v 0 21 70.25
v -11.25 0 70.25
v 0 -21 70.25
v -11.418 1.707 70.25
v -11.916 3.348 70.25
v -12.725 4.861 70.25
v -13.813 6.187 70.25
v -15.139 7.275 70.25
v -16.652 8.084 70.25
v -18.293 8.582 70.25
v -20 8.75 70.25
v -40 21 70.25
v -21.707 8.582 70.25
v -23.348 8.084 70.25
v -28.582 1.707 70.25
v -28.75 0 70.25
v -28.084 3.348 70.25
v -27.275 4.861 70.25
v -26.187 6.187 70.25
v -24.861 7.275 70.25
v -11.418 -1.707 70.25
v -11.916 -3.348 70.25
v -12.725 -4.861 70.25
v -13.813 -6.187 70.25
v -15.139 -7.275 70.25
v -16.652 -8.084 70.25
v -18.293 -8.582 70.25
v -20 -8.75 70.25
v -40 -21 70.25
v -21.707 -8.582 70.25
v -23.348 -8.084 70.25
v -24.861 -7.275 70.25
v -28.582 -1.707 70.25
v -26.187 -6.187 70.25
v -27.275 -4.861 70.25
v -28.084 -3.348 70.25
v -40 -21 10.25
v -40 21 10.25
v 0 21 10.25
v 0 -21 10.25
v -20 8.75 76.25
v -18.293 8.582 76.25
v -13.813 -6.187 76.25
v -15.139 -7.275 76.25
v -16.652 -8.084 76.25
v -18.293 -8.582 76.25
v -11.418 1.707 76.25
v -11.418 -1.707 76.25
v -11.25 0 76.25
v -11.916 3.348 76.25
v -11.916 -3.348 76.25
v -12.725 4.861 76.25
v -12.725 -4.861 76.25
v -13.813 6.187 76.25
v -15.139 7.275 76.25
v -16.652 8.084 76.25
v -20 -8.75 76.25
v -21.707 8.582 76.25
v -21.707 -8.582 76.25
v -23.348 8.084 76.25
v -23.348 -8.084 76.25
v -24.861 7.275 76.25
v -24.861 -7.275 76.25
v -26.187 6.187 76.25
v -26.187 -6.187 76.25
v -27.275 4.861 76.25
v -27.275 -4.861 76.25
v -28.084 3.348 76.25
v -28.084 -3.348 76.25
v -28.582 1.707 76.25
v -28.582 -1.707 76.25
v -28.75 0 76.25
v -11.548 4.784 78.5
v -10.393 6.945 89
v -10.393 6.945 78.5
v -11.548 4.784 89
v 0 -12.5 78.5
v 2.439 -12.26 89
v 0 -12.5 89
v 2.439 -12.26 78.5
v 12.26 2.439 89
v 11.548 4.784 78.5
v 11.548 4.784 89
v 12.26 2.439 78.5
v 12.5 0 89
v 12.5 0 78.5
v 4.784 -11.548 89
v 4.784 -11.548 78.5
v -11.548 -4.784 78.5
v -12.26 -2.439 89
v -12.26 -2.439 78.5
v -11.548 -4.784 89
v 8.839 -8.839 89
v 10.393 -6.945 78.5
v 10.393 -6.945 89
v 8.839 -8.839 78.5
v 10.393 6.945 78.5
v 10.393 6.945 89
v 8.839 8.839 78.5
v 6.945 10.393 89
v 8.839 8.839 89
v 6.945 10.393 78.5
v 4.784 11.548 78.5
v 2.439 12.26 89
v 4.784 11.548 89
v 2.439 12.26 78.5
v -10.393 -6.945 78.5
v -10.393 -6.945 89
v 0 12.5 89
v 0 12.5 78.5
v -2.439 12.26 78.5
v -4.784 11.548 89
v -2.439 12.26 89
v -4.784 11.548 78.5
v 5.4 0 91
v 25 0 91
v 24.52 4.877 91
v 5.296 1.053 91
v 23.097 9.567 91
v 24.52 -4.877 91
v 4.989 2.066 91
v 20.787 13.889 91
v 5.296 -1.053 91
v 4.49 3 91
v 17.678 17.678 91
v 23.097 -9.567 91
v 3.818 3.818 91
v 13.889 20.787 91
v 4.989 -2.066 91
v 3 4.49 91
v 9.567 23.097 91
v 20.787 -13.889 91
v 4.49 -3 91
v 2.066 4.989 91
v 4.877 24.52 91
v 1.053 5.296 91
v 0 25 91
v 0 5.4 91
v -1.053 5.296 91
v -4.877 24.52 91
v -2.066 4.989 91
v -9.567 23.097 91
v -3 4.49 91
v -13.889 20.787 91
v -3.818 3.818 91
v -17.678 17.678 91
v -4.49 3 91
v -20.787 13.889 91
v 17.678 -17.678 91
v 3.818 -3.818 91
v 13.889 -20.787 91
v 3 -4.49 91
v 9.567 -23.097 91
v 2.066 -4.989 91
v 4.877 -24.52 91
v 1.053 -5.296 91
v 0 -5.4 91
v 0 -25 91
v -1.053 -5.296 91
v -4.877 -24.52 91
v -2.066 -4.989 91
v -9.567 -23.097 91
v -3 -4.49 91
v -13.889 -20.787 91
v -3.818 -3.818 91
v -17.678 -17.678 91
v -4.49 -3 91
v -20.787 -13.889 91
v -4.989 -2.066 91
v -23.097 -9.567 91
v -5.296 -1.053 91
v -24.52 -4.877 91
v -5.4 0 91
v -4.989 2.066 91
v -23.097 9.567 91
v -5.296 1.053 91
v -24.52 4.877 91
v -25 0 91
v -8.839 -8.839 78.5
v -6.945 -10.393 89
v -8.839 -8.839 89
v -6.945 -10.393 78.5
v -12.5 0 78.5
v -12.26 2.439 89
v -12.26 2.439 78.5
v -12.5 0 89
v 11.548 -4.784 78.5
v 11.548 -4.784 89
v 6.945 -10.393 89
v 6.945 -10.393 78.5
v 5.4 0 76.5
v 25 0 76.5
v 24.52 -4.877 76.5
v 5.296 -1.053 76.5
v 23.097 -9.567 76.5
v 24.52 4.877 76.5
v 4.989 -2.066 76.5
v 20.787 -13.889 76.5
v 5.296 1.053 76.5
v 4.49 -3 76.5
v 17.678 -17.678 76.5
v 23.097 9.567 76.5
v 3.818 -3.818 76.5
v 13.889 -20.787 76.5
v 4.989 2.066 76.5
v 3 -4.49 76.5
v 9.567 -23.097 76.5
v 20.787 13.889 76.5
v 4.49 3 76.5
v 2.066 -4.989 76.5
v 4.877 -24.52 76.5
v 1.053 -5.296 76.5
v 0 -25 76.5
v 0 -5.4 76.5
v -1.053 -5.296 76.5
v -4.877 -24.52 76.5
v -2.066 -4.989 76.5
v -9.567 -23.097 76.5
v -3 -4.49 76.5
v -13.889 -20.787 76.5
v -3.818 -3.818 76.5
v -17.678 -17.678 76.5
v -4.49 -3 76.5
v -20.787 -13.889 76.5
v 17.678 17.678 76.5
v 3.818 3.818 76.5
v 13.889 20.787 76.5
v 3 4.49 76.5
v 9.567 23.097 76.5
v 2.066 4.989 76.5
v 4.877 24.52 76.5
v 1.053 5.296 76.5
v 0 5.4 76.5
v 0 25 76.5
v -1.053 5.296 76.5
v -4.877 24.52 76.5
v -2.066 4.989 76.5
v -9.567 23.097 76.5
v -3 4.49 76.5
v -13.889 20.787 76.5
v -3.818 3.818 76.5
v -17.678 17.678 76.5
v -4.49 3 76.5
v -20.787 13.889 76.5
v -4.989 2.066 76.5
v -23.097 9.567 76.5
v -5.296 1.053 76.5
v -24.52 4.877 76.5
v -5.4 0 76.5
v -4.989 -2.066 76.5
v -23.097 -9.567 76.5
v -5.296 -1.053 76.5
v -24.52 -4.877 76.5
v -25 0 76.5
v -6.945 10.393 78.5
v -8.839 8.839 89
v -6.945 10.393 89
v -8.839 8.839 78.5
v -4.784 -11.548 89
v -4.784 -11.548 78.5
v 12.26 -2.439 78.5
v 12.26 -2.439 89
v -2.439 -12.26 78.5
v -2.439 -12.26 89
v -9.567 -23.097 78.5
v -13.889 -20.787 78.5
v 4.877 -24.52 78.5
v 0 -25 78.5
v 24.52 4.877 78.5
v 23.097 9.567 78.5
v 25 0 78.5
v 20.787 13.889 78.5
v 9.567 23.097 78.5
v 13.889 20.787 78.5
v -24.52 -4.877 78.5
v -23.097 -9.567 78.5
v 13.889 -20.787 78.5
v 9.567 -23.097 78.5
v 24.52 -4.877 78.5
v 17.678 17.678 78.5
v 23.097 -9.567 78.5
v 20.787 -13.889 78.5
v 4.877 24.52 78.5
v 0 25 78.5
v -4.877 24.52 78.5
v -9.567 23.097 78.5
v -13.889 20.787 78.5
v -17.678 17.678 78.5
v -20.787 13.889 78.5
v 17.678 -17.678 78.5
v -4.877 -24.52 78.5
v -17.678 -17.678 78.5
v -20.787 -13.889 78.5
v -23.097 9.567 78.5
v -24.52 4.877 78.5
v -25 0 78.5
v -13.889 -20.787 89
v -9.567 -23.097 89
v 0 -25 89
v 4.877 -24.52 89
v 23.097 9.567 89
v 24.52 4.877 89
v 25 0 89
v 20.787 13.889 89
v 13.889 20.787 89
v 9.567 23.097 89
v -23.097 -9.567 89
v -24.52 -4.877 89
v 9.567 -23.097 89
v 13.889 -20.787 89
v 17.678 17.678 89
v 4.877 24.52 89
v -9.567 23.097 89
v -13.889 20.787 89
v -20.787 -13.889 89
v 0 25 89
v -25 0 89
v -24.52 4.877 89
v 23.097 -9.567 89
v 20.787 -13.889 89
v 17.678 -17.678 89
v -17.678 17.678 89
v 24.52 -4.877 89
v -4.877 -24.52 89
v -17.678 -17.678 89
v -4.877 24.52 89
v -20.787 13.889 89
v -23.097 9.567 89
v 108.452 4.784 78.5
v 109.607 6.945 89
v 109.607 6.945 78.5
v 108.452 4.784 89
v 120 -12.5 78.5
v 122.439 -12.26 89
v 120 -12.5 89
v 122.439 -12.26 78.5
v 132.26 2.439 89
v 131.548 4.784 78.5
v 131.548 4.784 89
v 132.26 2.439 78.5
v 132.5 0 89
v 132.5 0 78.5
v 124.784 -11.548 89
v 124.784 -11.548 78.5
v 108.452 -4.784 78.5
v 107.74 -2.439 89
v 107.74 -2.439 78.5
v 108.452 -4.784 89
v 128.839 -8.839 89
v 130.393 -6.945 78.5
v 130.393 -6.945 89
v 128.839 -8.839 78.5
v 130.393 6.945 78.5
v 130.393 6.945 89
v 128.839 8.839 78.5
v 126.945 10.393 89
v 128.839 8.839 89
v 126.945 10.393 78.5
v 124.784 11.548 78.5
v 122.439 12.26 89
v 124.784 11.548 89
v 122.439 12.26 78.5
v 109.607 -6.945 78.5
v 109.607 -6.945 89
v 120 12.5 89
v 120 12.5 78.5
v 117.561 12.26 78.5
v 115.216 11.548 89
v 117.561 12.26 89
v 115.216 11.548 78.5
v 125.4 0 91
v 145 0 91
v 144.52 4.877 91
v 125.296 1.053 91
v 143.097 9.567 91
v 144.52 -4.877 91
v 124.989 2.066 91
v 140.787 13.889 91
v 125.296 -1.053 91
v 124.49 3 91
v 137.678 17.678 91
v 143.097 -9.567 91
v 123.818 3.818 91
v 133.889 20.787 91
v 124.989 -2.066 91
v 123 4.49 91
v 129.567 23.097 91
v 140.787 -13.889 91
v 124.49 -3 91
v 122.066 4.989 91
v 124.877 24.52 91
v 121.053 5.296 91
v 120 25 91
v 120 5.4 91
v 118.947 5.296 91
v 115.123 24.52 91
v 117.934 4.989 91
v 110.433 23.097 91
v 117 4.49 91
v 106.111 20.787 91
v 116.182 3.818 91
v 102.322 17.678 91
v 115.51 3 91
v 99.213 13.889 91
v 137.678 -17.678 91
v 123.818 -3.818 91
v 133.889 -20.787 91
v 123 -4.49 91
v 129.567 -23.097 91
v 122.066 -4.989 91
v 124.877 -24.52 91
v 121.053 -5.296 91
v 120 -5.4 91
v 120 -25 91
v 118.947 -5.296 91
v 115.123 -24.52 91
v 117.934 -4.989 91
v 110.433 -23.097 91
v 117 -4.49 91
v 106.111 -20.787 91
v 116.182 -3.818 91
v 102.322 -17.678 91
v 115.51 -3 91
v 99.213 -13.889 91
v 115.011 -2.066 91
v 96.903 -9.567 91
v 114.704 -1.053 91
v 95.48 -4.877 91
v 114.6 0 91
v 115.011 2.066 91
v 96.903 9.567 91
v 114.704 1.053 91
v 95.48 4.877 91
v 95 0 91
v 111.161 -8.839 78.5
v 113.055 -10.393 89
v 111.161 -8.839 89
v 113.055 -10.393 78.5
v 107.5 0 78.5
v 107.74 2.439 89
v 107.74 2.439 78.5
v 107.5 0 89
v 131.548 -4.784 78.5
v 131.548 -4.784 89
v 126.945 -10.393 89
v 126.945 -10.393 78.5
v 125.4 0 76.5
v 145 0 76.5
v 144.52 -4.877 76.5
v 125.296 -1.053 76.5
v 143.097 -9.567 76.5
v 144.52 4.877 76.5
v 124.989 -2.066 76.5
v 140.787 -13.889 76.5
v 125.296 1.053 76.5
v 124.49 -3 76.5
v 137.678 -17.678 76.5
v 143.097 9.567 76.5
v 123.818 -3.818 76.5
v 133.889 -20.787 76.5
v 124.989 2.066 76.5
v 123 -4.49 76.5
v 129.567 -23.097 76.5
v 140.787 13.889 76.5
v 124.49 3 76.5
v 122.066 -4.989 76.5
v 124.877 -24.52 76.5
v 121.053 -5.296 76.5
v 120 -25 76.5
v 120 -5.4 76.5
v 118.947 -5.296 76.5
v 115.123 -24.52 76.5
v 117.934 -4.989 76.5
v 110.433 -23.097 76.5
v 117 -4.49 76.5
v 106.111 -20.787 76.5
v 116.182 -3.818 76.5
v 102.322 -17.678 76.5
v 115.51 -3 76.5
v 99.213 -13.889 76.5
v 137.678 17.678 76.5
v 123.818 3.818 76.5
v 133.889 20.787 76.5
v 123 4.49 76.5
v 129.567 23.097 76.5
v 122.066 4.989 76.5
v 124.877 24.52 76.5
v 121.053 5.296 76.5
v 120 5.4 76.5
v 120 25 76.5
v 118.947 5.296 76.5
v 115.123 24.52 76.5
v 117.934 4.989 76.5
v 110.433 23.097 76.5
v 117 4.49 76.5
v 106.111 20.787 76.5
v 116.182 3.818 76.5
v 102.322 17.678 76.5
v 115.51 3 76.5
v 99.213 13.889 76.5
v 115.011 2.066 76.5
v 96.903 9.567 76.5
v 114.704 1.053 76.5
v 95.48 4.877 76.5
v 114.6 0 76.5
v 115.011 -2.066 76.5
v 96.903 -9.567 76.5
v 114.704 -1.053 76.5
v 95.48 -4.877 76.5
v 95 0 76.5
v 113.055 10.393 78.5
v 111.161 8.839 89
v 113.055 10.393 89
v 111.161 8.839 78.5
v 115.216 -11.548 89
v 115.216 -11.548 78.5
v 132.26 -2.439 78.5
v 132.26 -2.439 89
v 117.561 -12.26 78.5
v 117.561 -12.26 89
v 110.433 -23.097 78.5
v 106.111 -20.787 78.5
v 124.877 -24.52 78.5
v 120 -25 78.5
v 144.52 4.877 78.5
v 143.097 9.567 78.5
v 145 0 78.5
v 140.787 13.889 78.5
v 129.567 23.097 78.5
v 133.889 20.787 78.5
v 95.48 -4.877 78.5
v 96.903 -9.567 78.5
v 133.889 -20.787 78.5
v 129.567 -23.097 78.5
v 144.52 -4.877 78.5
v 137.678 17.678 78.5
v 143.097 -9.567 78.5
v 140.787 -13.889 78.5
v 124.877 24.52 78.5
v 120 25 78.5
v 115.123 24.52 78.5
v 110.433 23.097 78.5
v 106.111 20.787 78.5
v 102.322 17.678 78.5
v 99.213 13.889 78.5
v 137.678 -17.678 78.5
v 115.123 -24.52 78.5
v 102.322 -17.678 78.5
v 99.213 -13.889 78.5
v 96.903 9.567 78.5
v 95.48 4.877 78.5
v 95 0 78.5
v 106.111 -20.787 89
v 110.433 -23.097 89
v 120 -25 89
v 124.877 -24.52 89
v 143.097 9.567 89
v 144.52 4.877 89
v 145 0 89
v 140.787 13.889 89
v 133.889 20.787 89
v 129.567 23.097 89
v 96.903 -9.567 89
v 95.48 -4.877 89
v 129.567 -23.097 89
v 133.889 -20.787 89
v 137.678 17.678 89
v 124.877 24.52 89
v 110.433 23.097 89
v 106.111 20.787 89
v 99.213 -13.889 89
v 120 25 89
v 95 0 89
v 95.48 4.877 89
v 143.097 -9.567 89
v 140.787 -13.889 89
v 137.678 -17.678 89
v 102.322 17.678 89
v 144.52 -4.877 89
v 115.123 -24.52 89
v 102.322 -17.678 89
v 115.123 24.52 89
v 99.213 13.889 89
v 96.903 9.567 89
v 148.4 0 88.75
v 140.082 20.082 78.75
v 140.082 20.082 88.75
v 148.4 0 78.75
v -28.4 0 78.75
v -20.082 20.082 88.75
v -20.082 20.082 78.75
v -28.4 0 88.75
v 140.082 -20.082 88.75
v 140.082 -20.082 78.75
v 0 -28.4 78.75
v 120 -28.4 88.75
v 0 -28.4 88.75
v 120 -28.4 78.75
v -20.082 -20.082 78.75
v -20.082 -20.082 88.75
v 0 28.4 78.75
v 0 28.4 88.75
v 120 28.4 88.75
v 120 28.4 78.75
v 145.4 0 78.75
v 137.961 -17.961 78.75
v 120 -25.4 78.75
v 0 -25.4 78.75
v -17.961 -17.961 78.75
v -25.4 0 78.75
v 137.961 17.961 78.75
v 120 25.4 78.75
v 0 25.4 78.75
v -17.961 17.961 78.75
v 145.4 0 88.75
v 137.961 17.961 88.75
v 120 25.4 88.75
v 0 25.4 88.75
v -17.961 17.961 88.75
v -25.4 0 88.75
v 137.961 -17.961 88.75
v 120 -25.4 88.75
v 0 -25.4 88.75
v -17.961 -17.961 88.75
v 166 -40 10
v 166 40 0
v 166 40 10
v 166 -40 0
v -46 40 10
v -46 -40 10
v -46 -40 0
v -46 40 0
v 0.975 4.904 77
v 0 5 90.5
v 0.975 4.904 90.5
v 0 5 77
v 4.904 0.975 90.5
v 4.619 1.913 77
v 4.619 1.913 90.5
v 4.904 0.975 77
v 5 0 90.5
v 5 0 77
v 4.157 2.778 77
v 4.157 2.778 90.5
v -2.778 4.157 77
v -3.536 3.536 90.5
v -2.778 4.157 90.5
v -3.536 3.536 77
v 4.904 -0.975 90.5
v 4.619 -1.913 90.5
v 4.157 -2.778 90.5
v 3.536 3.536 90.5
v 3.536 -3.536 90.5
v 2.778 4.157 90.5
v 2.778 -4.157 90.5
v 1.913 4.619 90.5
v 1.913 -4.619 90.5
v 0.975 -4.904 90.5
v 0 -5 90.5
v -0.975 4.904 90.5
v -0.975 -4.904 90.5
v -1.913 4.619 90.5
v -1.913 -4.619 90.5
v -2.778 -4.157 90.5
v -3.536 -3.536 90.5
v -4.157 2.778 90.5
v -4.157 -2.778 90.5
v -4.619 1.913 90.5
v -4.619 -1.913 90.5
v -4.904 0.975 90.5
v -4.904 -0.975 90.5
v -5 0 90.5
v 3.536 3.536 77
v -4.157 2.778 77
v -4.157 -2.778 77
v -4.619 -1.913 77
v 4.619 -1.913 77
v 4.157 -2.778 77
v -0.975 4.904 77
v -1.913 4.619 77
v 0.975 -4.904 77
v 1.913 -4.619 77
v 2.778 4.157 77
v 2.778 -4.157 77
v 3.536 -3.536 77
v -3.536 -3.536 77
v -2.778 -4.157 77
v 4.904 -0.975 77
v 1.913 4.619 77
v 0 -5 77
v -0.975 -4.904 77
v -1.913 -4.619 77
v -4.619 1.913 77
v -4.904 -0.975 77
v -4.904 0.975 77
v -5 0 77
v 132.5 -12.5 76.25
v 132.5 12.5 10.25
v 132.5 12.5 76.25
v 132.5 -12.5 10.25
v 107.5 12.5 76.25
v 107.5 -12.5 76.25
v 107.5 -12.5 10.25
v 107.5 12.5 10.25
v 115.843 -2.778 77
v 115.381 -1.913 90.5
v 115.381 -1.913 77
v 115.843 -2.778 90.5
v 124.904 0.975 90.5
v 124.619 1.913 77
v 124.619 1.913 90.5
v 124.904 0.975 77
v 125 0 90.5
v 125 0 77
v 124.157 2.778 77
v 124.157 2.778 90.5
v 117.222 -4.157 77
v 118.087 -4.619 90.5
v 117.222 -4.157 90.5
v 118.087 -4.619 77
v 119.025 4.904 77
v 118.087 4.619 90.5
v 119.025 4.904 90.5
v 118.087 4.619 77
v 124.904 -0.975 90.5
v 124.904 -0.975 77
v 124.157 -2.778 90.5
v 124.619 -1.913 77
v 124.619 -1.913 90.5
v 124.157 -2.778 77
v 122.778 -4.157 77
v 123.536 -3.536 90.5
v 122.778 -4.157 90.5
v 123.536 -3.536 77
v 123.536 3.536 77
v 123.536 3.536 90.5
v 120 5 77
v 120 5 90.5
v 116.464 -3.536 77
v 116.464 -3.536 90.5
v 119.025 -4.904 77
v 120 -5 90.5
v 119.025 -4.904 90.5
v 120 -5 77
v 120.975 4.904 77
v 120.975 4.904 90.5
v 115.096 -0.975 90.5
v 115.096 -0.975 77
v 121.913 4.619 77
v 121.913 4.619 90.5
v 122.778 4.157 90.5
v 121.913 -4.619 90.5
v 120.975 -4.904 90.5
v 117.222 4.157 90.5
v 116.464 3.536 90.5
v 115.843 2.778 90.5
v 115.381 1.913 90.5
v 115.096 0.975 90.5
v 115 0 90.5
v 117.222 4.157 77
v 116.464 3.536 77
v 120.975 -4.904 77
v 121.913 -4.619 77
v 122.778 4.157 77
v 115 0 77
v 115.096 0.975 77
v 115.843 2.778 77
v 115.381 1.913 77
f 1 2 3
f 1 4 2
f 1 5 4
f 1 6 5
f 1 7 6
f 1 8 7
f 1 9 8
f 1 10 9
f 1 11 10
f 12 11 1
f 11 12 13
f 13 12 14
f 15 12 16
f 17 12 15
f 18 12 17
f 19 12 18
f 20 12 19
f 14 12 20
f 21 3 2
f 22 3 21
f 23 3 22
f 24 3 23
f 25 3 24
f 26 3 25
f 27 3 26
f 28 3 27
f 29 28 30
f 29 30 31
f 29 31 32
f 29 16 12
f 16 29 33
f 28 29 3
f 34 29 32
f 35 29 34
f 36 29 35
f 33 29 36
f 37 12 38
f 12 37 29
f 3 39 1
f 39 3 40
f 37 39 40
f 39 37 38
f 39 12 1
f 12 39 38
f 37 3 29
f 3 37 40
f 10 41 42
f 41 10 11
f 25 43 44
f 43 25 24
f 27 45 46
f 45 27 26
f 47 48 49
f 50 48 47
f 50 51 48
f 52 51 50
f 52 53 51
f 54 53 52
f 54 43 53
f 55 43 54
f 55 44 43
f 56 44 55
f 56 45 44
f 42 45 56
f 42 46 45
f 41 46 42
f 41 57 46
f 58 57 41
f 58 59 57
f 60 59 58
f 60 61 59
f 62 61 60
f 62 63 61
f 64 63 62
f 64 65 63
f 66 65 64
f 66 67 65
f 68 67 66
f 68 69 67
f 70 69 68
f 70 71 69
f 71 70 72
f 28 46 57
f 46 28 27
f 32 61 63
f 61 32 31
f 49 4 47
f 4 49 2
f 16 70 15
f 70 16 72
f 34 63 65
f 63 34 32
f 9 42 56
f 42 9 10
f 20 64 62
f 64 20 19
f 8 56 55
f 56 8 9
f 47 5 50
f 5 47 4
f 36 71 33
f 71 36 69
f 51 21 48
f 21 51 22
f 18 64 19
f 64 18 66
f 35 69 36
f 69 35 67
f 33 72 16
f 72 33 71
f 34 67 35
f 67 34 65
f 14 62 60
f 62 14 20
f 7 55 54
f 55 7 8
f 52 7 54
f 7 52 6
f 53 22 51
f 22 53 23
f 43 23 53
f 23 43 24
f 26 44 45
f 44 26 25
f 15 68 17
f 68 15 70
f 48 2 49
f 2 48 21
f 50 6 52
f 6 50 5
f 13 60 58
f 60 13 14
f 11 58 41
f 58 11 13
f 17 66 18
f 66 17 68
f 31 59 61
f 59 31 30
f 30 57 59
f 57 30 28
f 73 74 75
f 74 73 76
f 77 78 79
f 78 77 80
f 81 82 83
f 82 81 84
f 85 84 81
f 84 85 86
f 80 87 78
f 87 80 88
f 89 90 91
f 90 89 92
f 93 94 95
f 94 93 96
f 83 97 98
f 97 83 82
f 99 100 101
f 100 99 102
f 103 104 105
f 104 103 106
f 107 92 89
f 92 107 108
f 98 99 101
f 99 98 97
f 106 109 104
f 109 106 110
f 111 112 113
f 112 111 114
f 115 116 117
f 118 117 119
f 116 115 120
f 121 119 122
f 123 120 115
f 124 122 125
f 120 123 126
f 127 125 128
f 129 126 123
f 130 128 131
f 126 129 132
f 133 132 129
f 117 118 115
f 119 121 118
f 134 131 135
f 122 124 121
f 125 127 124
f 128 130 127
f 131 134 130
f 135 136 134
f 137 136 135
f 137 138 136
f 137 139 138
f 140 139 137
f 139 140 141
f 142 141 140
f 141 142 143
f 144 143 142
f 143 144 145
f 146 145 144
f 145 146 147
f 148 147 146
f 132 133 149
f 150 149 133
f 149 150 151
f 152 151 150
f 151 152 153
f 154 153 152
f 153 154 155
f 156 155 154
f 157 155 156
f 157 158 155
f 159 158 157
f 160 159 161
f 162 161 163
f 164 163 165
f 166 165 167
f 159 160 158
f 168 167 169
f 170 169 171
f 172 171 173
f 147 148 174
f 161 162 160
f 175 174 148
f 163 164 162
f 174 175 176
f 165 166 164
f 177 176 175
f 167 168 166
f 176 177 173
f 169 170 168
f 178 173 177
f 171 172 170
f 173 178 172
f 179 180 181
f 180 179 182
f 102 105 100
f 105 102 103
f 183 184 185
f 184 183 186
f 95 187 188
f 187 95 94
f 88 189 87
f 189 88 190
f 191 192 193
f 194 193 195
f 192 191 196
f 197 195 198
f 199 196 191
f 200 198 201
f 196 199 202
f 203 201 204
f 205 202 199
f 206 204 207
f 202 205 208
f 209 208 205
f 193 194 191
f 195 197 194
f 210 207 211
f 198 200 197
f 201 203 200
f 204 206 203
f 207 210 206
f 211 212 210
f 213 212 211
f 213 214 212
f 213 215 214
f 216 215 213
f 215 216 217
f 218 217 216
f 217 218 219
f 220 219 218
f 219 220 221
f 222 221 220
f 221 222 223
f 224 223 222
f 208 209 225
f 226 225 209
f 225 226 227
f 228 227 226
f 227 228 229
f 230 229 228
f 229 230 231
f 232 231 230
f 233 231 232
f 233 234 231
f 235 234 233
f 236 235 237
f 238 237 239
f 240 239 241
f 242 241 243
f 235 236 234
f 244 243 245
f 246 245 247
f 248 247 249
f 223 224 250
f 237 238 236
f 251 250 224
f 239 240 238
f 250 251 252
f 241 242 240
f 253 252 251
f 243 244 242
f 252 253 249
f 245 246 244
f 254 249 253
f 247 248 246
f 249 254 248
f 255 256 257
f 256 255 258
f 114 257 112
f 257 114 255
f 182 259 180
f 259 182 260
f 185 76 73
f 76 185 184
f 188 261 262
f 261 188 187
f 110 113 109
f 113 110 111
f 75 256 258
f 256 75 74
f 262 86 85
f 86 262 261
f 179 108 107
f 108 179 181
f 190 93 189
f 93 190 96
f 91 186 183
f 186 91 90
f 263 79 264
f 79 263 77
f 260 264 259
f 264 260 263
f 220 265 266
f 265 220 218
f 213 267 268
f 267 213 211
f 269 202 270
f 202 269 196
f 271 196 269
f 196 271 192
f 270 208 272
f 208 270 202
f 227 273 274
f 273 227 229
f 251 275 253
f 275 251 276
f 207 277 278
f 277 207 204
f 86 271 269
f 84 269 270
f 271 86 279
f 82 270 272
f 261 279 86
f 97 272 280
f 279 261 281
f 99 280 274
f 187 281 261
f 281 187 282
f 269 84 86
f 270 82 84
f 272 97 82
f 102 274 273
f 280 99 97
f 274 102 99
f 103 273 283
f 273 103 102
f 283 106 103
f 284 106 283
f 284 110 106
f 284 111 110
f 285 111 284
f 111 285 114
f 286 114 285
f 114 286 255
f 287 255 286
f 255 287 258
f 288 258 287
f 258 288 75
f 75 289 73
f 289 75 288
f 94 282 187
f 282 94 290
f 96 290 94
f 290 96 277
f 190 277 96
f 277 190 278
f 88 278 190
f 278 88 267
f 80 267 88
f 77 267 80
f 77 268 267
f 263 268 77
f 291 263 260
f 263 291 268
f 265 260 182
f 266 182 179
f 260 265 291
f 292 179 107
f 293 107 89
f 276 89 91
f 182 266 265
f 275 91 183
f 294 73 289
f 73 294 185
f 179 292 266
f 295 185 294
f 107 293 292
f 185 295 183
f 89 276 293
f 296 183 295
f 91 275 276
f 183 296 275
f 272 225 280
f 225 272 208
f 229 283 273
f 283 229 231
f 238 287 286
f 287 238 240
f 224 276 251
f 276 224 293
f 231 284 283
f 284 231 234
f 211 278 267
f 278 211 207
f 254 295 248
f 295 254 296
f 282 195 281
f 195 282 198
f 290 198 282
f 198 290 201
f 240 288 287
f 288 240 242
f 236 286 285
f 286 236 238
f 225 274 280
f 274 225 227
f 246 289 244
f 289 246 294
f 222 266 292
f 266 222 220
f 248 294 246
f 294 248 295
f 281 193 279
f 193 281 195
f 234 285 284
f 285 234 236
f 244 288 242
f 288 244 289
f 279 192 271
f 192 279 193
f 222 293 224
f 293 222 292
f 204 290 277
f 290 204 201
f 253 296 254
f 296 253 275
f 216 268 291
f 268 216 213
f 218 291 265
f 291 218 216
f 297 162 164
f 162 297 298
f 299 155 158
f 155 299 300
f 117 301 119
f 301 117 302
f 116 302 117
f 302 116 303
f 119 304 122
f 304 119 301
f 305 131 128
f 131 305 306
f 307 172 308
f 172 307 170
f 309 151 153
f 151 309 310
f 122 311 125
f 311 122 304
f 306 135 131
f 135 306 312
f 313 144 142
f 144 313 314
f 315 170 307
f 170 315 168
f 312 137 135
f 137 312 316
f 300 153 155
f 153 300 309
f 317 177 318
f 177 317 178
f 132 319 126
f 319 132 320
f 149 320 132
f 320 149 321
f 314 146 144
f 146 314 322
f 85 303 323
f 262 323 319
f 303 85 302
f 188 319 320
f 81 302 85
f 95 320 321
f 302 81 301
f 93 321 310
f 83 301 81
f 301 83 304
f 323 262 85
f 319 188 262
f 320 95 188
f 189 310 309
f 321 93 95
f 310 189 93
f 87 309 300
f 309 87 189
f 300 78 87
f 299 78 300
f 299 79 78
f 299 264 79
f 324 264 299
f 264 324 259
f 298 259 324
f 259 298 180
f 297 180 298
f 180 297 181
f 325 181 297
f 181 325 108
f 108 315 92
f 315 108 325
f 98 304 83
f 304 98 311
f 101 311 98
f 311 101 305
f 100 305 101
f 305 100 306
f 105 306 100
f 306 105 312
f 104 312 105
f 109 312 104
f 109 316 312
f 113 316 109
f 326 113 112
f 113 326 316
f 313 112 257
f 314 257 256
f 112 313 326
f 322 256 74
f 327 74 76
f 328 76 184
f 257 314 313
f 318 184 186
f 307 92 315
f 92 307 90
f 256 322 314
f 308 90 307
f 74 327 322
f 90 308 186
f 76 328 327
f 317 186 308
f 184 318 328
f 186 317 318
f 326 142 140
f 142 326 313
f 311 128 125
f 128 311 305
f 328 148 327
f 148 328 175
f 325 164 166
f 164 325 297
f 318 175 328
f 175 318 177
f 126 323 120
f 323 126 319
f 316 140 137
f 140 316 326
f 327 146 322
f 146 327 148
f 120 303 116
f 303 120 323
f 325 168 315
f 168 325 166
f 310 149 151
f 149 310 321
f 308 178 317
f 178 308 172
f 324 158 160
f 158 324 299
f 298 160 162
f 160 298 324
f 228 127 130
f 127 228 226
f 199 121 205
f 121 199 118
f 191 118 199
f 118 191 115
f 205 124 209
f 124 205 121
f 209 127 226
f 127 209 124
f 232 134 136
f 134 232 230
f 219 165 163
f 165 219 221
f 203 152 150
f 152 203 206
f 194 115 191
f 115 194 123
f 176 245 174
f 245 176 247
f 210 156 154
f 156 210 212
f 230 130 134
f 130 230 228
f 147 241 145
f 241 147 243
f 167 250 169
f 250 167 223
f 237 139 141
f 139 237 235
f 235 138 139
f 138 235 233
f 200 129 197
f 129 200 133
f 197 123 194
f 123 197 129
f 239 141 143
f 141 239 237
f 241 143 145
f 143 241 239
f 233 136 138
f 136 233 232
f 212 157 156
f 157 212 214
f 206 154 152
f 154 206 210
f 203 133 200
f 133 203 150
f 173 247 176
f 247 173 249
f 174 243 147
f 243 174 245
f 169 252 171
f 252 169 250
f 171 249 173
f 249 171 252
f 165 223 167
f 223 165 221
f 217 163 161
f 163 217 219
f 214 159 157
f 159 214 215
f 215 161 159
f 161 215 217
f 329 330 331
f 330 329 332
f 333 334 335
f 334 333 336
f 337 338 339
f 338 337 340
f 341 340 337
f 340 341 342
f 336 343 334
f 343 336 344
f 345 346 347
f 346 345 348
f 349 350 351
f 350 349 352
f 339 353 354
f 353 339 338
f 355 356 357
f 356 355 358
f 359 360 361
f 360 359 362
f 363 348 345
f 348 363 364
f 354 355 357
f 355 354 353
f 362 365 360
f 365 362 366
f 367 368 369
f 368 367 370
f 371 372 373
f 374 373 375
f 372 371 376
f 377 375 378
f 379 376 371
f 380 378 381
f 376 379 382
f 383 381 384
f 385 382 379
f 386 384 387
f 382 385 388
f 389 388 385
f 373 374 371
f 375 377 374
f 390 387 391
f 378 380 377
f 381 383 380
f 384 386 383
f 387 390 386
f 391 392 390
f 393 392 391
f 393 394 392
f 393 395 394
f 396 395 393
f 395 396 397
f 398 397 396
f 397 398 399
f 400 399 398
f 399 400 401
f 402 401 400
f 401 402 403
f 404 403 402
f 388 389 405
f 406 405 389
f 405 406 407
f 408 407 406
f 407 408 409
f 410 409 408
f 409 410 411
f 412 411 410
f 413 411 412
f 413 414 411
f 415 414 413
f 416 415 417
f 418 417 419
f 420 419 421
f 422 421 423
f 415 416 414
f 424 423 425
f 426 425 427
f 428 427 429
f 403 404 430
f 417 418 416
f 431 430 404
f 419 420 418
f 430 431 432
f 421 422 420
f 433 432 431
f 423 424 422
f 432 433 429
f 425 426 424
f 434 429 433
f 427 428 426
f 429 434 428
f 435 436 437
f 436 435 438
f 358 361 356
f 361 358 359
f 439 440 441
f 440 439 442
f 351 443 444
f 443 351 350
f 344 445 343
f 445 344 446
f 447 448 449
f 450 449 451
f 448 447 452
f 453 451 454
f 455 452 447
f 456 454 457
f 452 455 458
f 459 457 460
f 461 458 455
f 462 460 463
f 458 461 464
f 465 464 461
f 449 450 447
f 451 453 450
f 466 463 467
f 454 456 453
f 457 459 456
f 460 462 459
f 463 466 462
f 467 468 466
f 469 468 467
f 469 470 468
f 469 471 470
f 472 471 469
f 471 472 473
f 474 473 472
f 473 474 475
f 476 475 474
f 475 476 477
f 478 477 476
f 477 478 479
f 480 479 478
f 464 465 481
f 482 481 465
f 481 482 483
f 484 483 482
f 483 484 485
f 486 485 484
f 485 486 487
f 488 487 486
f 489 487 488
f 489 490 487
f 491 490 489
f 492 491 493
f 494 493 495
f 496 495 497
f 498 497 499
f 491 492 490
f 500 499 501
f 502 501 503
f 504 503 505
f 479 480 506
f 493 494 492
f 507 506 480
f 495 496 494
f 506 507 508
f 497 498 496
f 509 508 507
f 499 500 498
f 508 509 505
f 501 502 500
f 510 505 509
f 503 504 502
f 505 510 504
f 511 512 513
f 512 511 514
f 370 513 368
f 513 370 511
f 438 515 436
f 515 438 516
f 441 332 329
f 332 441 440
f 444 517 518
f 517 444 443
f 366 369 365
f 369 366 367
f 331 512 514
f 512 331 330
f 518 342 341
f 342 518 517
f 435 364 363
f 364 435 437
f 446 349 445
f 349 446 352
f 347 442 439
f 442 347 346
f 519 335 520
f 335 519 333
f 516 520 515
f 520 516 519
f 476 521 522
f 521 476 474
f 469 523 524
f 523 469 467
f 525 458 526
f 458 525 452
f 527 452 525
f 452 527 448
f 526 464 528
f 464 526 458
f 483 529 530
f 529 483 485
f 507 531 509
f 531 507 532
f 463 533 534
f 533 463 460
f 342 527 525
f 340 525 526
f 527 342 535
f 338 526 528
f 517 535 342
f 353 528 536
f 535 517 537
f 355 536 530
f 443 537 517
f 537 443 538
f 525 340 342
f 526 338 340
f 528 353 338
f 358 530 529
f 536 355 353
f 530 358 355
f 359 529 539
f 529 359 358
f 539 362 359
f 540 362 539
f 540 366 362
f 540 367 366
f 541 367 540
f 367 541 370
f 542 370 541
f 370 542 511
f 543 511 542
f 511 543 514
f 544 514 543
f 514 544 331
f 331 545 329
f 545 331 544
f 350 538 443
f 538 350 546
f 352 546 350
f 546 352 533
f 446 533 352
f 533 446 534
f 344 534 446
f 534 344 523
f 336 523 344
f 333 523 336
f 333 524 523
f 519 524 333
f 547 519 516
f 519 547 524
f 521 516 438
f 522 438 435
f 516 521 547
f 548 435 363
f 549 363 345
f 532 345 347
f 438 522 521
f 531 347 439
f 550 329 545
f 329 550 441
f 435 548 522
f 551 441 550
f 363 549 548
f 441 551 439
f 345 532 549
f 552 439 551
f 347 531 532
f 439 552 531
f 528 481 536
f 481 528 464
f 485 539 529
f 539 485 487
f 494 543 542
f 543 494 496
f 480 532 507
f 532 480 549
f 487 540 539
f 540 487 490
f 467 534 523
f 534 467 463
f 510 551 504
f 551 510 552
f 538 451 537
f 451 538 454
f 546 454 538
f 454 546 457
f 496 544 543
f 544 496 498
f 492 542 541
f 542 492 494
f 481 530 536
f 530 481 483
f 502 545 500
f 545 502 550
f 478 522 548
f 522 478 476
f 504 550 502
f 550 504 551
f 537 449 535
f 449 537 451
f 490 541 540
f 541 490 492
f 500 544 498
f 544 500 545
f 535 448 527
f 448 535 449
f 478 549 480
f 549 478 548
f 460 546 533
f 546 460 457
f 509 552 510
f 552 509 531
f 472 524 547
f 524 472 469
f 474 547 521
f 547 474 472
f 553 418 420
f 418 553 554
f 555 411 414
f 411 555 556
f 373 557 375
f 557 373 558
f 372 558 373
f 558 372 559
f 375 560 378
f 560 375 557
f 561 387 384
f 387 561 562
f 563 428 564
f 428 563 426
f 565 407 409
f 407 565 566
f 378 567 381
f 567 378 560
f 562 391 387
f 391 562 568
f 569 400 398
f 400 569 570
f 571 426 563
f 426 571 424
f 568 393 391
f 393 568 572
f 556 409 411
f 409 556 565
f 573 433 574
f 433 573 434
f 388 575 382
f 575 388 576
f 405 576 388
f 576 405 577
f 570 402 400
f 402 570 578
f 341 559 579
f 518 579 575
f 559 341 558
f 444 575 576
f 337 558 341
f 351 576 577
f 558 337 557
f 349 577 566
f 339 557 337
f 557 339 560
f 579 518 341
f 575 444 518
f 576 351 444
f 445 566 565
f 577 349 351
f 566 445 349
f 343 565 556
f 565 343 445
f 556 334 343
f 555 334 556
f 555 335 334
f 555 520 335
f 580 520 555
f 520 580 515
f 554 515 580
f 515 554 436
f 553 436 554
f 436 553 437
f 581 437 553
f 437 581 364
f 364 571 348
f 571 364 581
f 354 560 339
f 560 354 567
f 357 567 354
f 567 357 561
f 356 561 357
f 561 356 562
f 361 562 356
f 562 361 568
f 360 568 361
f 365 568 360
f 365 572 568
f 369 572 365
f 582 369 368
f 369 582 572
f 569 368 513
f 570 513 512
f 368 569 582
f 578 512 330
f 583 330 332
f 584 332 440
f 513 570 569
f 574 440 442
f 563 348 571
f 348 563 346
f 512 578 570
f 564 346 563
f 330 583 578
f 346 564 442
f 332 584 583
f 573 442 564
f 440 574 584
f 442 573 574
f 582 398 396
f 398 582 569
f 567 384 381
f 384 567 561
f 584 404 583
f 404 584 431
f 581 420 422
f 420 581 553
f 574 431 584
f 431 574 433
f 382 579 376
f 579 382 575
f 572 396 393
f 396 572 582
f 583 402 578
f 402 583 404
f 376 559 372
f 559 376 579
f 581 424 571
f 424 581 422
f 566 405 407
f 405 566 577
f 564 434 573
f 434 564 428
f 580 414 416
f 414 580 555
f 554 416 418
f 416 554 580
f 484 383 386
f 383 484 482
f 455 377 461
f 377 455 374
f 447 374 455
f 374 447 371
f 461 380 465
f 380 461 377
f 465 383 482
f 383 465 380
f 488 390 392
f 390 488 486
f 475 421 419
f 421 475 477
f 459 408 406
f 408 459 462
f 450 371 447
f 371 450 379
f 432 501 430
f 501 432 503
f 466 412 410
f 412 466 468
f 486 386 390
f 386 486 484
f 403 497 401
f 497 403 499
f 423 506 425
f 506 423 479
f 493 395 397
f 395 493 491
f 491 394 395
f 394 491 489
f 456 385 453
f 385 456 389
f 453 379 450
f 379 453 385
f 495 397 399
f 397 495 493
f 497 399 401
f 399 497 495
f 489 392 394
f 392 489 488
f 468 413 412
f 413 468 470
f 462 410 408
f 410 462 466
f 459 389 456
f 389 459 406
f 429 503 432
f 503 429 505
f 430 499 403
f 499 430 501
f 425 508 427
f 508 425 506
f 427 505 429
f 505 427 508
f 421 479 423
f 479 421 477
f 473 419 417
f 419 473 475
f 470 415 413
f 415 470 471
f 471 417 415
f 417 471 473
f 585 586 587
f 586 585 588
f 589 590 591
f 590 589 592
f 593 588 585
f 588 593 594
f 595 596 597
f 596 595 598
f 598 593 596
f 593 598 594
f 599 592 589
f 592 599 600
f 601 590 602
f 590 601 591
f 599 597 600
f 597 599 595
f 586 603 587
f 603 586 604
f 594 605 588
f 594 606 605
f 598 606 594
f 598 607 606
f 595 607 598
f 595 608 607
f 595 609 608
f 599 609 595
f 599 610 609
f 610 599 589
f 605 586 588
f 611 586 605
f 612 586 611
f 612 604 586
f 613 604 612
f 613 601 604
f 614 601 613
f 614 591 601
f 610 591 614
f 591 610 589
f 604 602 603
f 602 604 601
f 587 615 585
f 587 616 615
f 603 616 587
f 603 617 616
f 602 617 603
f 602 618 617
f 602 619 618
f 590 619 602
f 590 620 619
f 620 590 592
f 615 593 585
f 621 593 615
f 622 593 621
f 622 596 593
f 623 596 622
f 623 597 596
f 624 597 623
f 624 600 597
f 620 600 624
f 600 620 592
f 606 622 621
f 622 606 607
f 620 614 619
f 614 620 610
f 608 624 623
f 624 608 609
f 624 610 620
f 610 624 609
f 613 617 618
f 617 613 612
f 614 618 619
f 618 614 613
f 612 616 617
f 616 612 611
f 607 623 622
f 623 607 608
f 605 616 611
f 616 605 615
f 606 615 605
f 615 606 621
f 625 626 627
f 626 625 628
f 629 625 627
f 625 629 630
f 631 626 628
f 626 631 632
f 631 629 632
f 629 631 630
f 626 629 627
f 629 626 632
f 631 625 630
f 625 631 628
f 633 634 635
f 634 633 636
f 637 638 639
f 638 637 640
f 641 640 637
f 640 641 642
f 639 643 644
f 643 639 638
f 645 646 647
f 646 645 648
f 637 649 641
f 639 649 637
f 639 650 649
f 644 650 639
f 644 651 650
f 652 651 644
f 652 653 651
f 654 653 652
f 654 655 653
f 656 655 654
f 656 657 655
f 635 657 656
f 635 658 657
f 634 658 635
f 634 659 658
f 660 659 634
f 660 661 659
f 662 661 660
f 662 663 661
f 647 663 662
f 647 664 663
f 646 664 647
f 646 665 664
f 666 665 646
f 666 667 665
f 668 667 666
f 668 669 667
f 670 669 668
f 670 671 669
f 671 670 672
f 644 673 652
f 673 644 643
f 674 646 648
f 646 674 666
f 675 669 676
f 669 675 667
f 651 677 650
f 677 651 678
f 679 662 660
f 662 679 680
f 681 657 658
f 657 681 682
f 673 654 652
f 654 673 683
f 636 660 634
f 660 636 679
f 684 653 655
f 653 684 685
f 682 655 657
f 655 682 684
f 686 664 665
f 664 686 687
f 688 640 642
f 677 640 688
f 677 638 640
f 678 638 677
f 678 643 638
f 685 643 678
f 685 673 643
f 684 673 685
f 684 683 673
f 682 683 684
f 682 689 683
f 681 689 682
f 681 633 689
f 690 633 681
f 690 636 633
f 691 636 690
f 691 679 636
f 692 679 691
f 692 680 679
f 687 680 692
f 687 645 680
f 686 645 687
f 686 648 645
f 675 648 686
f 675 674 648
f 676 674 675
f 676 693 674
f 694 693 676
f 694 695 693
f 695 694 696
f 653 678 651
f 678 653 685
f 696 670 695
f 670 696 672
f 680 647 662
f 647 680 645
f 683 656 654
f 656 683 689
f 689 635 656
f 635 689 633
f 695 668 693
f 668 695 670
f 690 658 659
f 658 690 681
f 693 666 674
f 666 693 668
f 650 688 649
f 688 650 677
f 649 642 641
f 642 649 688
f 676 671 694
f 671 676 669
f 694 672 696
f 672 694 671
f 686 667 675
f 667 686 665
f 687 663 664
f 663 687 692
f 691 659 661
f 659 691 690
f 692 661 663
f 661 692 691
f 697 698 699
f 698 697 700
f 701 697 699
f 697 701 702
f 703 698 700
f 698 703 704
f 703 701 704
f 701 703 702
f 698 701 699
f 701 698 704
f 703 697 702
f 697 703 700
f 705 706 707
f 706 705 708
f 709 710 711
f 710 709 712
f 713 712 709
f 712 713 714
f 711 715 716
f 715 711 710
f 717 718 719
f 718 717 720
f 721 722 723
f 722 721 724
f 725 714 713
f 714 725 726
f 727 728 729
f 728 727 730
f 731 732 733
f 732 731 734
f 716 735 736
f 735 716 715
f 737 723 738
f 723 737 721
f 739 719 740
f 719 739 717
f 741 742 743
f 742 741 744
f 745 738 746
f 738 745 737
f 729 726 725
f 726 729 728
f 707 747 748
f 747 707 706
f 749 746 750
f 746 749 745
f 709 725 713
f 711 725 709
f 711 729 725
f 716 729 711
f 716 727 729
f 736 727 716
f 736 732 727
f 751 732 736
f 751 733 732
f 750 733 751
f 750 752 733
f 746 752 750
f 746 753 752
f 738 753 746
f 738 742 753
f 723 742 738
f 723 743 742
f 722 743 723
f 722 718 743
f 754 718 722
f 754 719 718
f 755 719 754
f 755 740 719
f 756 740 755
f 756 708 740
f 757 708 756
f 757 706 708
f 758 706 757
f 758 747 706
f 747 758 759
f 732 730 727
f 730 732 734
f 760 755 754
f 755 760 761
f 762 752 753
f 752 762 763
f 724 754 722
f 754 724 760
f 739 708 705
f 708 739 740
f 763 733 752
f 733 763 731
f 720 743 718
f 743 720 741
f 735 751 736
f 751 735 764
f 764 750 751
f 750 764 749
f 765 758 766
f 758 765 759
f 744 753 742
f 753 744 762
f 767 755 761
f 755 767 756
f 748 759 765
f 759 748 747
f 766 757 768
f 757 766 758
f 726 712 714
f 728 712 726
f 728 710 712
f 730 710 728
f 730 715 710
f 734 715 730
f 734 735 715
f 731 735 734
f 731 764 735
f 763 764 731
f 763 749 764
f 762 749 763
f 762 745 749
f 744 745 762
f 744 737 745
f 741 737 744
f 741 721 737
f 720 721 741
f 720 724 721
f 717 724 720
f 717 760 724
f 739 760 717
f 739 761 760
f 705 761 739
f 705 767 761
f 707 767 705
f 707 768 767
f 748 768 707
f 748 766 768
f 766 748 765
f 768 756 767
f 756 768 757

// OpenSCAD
$fn = 32;

// ------------------------------------------------------------------------
// Motor belt drive: span 120 mm, pulleys d50, belt 10 mm wide
// Every part is its own module, assembly() places every instance.
// ------------------------------------------------------------------------

// --- part 1 ---
module base_plate() {
  difference() {
    translate([-106, -40, 0]) cube([212, 80, 10]);
  }
}

// --- part 2 ---
module motor() {
  union() {
    translate([-30, -21, 0]) cube([60, 42, 40]);
    translate([33, 0, 20]) rotate([0, 90, 0]) cylinder(h = 6, d = 17.5, center = true);
  }
}

// --- part 3 ---
module drive_shaft() {
  translate([0, 0, -6.75]) cylinder(h = 13.5, d = 10);
}

// --- part 4 ---
module pulley_drive() {
  difference() {
    union() {
      cylinder(h = 14.5, d = 25);
      cylinder(h = 2, d = 50);
      translate([0, 0, 12.5]) cylinder(h = 2, d = 50);
    }
    translate([0, 0, -1]) cylinder(h = 16.5, d = 10.8);
  }
}

// --- part 5 ---
module idler_post() {
  translate([-12.5, -12.5, 0]) cube([25, 25, 66]);
}

// --- part 6 ---
module driven_shaft() {
  translate([0, 0, -6.75]) cylinder(h = 13.5, d = 10);
}

// --- part 7 ---
module pulley_driven() {
  difference() {
    union() {
      cylinder(h = 14.5, d = 25);
      cylinder(h = 2, d = 50);
      translate([0, 0, 12.5]) cylinder(h = 2, d = 50);
    }
    translate([0, 0, -1]) cylinder(h = 16.5, d = 10.8);
  }
}

// --- part 8 ---
module drive_belt() {
  difference() {
    linear_extrude(height = 10) polygon(points = concat([for (a = [90 : 45 : 270]) [28.4 * cos(a), 28.4 * sin(a)]], [for (a = [270 : 45 : 450]) [120 + 28.4 * cos(a), 28.4 * sin(a)]]));
    translate([0, 0, -1]) linear_extrude(height = 12) polygon(points = concat([for (a = [90 : 45 : 270]) [25.4 * cos(a), 25.4 * sin(a)]], [for (a = [270 : 45 : 450]) [120 + 25.4 * cos(a), 25.4 * sin(a)]]));
  }
}

// --- assembly ---
module assembly() {
  color([0.80, 0.24, 0.20]) translate([60, 0, 0]) rotate([0, 0, 0]) base_plate();
  color([0.20, 0.45, 0.75]) translate([0, 0, 40.25]) rotate([0, 270, 0]) motor();
  color([0.25, 0.62, 0.32]) translate([0, 0, 83.75]) rotate([0, 0, 0]) drive_shaft();
  color([0.92, 0.70, 0.18]) translate([0, 0, 76.5]) rotate([0, 0, 0]) pulley_drive();
  color([0.58, 0.35, 0.70]) translate([120, 0, 10.25]) rotate([0, 0, 0]) idler_post();
  color([0.16, 0.66, 0.66]) translate([120, 0, 83.75]) rotate([0, 0, 0]) driven_shaft();
  color([0.85, 0.48, 0.18]) translate([120, 0, 76.5]) rotate([0, 0, 0]) pulley_driven();
  color([0.55, 0.60, 0.65]) translate([0, 0, 78.75]) rotate([0, 0, 0]) drive_belt();
}

assembly();
